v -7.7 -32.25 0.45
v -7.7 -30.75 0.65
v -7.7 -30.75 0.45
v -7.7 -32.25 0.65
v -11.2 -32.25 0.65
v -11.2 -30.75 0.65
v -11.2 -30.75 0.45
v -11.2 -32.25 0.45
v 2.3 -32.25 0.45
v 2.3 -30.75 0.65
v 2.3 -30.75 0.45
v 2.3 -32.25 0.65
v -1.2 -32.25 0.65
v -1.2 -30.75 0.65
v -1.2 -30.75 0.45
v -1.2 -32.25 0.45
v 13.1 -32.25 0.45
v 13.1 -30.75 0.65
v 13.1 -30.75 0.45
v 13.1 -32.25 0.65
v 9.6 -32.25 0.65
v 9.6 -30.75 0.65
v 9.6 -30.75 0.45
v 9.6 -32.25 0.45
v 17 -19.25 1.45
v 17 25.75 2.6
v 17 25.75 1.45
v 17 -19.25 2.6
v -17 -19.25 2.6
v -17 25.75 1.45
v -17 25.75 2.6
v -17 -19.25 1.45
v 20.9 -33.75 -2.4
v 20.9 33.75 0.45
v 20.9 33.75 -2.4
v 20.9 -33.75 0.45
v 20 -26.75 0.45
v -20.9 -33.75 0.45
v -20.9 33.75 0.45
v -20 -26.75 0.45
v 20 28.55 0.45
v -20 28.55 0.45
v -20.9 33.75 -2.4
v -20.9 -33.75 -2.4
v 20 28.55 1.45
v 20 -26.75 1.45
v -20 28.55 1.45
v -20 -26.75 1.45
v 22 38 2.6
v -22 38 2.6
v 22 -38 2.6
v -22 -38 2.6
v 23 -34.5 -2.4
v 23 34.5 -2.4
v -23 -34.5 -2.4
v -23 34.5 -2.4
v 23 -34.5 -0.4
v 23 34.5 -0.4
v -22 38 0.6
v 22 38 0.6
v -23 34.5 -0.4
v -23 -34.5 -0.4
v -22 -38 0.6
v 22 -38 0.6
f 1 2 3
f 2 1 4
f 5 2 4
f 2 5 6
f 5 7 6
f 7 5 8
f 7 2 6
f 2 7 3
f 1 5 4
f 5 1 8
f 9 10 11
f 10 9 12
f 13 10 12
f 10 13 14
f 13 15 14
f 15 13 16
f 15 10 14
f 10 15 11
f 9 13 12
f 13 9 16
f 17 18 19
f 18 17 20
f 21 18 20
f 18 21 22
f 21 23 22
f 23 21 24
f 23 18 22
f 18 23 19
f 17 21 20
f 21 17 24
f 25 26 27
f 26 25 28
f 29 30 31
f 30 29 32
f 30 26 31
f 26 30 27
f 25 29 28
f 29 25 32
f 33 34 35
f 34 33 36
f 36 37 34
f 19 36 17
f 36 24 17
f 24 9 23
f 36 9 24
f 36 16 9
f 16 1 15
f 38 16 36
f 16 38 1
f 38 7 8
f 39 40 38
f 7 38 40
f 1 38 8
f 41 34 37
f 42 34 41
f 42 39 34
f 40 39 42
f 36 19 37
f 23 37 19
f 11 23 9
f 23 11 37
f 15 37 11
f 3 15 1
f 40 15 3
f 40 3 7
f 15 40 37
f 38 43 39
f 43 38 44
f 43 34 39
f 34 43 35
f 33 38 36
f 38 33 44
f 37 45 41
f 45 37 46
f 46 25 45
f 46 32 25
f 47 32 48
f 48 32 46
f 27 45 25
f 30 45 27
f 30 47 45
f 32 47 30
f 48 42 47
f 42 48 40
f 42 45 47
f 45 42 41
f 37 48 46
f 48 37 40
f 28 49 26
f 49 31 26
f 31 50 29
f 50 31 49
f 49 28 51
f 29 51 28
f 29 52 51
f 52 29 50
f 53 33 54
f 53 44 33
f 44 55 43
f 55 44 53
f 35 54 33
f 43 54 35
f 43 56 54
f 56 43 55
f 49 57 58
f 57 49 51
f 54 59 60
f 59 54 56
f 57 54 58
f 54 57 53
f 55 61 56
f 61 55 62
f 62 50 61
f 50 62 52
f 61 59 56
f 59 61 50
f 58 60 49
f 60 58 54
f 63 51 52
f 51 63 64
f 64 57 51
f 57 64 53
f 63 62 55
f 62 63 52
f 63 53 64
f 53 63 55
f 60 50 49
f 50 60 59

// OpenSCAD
//ESP32 boards
ESP_T4   = [[40.8, 66.5, 1.25], //board
			[40.0, 55.3, 3.00], [0.4, 6.5, 0.0], //SCREEN OFFSET
			[6, 7.4, 3], [-1.5, 36.5, -4.25], //connector
			[ //buttons
				[[6.5,3.8, 1.5],[ 7.7, 0.0, 0.0],[1.5,1,1.5],[ 3.5,1.5,0.7]],
				[[6.5,3.8, 1.5],[17.7, 0.0, 0.0],[1.5,1,1.5],[ 3.5,1.5,0.7]],
				[[6.5,3.8, 1.5],[28.5, 0.0, 0.0],[1.5,1,1.5],[ 3.5,1.5,0.7]],
				[[3.0,5.0, 3.0],[ 0.0,56.0,-3.0],[2.0,1,0.5],[-2.0,1.5,1.0]],
			],
			[ //keep clear
			 [[34, 45, 10], [3.4, 14, 0.0]],
            [[41.8, 67.5, 4],[-0.5, -0.5, -2]]
             
			]
		];
ESP_TTGO = [[25.2, 51.2, 1.22],  //board
            [18.6, 32.0, 1.6], [3.3, 12.0, 2.0], //screen, offset
            [9, 7.4, 3.2], [8.0, -1.5, 0.15], //connector
            [ // buttons
                [[3.5, 4.3, 2.0], [ 2.5, 1.0, 0.0], [0.5, 0.5, 2.0], [2.5, 3.3, 0.5]],
                [[3.5, 4.3, 2.0], [18.5, 1.0, 0.0], [0.5, 0.5, 2.0], [2.5, 3.3, 0.5]],
                [[2.2, 4.8, 1.8], [22.7, 9.5, 0.0], [2.2, 1.4, 0.4], [2.0, 2.0, 1.0]]
            ],
            [ //keep clear
                [[23.6, 48.0, 8.0], [0.8, -1.0, -5.0]],
                [[16.6, 27.0, 4.0], [4.3, 16, 3.0]]
            ],
            
           ]; 

module battery(size=[30.6, 50, 6.6])
{
    color("#888800")
    cube(size, center=true);
}

module esp(type, show_clearance)
{
    translate([-type[0][0]/2, -type[0][1]/2, 0])
    {
        //board
        color("#111111")
        translate([0,0,-type[0][2]])
        cube(type[0]);
        
        //screen
        color("#AAAACCAA")
        translate(type[2]) cube(type[1]);

        // connector
        color("silver")
        hull() {
            translate(type[4]+[0.3, 0, 0]) cube(type[3]-[0.6, 0.0, 0.0]);
            translate(type[4]+[0.0, 0, 0.3]) cube(type[3]-[0.0, 0.0, 0.6]);
        }
        color("#FF8800")
        hull() {
            translate(type[4]+[-1, 0.4, 0.1]) cube(type[3]-[0.2, 0.8, 0.2]);
            translate(type[4]+[-1, 0.1, 0.4]) cube(type[3]-[0.2, 0.2, 0.8]);
        }
        
        for (button = type[5])
        {
            color("#DDDDDD")
            translate(button[1])
            cube(button[0]);
            
            color("#99FF00")
            translate(button[1] + button[2])
            cube(button[3]);
        }
        if (show_clearance)
        difference()
        {
            color("#FF000033")
            union() for (clear = type[6])
            translate(clear[1])
            cube(clear[0]);
        
            union() for (button = type[5])
            translate(button[1] + button[2])
            cube(button[3] + 5 * [for (a = [0:2]) button[2][a]-button[0][a] ? 0 : 1]);
                
        }
    }
}

module shape(size)
{
    hull()
    {
        translate([0,0,-8])
        cube(size + [-4,-1,0], center = true);
        
        translate([0,0,-5])
        cube(size + [-6, 6, 0],center=true);     
    }
}
difference()
{
    translate([0,0,6.6]) shape([50,70,2]);
    translate([0,0,-1.55])
    {
        scale(1) esp(ESP_T4, true);
        //translate([0,0,-8])
        //battery();
    }
}
